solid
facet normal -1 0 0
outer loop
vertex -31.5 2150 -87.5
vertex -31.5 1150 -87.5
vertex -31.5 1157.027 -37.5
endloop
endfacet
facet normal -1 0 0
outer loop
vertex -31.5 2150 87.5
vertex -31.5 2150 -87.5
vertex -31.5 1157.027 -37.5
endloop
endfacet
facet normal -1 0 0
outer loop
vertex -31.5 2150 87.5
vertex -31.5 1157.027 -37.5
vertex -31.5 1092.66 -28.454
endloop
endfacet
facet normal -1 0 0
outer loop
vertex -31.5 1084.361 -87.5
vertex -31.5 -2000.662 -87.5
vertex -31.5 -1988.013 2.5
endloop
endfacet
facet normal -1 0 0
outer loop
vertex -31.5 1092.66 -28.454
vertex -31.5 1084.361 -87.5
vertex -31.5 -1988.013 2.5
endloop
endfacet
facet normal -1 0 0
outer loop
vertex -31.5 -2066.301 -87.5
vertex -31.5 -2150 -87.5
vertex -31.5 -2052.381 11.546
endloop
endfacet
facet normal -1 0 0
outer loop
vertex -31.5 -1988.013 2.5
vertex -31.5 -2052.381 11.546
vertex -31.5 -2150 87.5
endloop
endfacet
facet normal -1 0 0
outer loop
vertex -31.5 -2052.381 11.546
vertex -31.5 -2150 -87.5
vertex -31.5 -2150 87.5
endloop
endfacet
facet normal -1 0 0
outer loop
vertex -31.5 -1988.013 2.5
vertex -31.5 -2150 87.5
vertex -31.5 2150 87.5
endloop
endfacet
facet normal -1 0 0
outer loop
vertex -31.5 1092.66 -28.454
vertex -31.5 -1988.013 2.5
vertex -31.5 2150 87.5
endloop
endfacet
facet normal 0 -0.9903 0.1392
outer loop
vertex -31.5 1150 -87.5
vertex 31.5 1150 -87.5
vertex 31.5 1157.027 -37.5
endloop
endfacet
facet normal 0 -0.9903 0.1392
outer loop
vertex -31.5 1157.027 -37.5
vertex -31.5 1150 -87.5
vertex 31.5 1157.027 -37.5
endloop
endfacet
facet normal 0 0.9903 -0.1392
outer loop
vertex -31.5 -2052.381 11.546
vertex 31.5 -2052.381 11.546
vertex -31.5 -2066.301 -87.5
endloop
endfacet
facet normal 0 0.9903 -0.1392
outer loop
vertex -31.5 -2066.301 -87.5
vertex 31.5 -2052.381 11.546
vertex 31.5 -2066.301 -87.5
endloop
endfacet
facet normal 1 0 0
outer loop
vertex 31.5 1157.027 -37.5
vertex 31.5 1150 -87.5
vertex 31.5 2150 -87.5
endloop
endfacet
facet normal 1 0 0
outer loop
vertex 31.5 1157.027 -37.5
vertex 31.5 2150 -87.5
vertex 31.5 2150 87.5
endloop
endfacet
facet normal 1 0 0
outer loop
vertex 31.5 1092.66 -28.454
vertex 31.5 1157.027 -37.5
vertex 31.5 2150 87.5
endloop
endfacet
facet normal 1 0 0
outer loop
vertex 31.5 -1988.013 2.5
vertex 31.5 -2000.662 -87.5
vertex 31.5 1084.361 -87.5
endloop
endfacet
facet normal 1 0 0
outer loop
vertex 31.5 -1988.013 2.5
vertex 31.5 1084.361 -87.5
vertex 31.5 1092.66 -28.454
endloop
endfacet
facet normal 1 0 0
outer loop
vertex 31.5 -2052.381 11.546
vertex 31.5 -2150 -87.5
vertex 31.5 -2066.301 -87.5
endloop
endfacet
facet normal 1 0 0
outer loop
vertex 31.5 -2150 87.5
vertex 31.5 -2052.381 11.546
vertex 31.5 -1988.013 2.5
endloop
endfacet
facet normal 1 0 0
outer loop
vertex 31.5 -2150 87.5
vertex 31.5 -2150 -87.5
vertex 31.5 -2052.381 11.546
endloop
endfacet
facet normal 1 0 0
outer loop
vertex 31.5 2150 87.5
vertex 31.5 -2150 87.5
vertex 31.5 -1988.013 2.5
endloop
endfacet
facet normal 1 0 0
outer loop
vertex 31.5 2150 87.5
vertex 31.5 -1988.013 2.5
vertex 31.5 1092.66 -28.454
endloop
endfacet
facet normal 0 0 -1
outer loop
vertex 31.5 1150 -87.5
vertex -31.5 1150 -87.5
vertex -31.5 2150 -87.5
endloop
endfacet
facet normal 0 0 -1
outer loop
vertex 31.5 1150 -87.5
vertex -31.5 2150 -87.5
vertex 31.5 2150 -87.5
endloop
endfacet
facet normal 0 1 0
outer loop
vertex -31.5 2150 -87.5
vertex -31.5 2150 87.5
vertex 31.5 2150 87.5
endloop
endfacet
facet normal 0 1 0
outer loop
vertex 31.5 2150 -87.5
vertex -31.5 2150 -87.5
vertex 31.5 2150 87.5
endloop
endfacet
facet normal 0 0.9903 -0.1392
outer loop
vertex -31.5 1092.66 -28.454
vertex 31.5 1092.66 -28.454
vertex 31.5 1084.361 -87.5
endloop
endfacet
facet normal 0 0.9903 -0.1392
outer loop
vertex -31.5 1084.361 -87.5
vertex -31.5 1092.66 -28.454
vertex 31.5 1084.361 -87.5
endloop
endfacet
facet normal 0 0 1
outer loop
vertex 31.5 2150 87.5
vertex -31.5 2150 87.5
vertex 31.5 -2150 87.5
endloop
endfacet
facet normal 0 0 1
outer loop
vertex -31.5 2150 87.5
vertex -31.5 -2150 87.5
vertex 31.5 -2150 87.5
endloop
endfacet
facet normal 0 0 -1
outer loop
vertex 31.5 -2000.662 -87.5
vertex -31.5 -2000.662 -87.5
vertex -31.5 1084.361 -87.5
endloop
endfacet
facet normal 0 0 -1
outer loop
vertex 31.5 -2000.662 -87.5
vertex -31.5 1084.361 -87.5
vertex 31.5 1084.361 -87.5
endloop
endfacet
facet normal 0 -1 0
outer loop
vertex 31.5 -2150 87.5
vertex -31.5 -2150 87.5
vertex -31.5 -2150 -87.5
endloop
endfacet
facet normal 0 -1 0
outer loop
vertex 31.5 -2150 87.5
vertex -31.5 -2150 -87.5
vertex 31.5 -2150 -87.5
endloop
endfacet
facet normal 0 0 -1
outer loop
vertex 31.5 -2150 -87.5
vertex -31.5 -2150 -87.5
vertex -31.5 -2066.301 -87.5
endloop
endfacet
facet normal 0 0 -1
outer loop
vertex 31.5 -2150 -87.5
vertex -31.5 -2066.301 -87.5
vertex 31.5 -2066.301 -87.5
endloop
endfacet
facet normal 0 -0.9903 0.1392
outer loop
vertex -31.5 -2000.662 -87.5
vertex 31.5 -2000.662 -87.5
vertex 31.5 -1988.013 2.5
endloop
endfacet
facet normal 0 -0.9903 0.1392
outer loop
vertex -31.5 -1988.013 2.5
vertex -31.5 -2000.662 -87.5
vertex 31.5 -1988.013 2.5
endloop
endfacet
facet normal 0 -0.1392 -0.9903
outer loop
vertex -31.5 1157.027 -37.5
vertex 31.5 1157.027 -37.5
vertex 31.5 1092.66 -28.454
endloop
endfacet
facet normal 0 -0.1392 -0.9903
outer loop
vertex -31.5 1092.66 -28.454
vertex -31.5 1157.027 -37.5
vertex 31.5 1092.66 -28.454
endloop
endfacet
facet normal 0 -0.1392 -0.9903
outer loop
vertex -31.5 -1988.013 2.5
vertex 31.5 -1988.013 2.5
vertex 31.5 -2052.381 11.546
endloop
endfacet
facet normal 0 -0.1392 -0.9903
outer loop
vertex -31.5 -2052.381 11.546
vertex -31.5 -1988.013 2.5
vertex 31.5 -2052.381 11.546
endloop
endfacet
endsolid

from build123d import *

# Parameters (mm, degrees)
F0_W     = 63
F0_H     = 175
F1_DEPTH = 2150
F3_DEPTH = 63


with BuildPart() as f1:
    # F0 (on Front) → F1 (new body, symmetric)
    with BuildSketch(Plane.XZ):
        Rectangle(F0_W, F0_H)
    extrude(amount=F1_DEPTH, both=True)

    # F2 (on face) → F3 (cut, through all)
    with BuildSketch(Plane.YZ.offset(31.5)):
        Polygon((1084.361208, -87.5), (1150, -87.5), (1157.027042, -37.5), (1092.659617, -28.453748), align=None)
        Polygon((-2066.300818, -87.5), (-2000.662026, -87.5), (-1988.013351, 2.5), (-2052.380776, 11.546252), align=None)
    extrude(amount=-F3_DEPTH, mode=Mode.SUBTRACT)


solid = f1.part
